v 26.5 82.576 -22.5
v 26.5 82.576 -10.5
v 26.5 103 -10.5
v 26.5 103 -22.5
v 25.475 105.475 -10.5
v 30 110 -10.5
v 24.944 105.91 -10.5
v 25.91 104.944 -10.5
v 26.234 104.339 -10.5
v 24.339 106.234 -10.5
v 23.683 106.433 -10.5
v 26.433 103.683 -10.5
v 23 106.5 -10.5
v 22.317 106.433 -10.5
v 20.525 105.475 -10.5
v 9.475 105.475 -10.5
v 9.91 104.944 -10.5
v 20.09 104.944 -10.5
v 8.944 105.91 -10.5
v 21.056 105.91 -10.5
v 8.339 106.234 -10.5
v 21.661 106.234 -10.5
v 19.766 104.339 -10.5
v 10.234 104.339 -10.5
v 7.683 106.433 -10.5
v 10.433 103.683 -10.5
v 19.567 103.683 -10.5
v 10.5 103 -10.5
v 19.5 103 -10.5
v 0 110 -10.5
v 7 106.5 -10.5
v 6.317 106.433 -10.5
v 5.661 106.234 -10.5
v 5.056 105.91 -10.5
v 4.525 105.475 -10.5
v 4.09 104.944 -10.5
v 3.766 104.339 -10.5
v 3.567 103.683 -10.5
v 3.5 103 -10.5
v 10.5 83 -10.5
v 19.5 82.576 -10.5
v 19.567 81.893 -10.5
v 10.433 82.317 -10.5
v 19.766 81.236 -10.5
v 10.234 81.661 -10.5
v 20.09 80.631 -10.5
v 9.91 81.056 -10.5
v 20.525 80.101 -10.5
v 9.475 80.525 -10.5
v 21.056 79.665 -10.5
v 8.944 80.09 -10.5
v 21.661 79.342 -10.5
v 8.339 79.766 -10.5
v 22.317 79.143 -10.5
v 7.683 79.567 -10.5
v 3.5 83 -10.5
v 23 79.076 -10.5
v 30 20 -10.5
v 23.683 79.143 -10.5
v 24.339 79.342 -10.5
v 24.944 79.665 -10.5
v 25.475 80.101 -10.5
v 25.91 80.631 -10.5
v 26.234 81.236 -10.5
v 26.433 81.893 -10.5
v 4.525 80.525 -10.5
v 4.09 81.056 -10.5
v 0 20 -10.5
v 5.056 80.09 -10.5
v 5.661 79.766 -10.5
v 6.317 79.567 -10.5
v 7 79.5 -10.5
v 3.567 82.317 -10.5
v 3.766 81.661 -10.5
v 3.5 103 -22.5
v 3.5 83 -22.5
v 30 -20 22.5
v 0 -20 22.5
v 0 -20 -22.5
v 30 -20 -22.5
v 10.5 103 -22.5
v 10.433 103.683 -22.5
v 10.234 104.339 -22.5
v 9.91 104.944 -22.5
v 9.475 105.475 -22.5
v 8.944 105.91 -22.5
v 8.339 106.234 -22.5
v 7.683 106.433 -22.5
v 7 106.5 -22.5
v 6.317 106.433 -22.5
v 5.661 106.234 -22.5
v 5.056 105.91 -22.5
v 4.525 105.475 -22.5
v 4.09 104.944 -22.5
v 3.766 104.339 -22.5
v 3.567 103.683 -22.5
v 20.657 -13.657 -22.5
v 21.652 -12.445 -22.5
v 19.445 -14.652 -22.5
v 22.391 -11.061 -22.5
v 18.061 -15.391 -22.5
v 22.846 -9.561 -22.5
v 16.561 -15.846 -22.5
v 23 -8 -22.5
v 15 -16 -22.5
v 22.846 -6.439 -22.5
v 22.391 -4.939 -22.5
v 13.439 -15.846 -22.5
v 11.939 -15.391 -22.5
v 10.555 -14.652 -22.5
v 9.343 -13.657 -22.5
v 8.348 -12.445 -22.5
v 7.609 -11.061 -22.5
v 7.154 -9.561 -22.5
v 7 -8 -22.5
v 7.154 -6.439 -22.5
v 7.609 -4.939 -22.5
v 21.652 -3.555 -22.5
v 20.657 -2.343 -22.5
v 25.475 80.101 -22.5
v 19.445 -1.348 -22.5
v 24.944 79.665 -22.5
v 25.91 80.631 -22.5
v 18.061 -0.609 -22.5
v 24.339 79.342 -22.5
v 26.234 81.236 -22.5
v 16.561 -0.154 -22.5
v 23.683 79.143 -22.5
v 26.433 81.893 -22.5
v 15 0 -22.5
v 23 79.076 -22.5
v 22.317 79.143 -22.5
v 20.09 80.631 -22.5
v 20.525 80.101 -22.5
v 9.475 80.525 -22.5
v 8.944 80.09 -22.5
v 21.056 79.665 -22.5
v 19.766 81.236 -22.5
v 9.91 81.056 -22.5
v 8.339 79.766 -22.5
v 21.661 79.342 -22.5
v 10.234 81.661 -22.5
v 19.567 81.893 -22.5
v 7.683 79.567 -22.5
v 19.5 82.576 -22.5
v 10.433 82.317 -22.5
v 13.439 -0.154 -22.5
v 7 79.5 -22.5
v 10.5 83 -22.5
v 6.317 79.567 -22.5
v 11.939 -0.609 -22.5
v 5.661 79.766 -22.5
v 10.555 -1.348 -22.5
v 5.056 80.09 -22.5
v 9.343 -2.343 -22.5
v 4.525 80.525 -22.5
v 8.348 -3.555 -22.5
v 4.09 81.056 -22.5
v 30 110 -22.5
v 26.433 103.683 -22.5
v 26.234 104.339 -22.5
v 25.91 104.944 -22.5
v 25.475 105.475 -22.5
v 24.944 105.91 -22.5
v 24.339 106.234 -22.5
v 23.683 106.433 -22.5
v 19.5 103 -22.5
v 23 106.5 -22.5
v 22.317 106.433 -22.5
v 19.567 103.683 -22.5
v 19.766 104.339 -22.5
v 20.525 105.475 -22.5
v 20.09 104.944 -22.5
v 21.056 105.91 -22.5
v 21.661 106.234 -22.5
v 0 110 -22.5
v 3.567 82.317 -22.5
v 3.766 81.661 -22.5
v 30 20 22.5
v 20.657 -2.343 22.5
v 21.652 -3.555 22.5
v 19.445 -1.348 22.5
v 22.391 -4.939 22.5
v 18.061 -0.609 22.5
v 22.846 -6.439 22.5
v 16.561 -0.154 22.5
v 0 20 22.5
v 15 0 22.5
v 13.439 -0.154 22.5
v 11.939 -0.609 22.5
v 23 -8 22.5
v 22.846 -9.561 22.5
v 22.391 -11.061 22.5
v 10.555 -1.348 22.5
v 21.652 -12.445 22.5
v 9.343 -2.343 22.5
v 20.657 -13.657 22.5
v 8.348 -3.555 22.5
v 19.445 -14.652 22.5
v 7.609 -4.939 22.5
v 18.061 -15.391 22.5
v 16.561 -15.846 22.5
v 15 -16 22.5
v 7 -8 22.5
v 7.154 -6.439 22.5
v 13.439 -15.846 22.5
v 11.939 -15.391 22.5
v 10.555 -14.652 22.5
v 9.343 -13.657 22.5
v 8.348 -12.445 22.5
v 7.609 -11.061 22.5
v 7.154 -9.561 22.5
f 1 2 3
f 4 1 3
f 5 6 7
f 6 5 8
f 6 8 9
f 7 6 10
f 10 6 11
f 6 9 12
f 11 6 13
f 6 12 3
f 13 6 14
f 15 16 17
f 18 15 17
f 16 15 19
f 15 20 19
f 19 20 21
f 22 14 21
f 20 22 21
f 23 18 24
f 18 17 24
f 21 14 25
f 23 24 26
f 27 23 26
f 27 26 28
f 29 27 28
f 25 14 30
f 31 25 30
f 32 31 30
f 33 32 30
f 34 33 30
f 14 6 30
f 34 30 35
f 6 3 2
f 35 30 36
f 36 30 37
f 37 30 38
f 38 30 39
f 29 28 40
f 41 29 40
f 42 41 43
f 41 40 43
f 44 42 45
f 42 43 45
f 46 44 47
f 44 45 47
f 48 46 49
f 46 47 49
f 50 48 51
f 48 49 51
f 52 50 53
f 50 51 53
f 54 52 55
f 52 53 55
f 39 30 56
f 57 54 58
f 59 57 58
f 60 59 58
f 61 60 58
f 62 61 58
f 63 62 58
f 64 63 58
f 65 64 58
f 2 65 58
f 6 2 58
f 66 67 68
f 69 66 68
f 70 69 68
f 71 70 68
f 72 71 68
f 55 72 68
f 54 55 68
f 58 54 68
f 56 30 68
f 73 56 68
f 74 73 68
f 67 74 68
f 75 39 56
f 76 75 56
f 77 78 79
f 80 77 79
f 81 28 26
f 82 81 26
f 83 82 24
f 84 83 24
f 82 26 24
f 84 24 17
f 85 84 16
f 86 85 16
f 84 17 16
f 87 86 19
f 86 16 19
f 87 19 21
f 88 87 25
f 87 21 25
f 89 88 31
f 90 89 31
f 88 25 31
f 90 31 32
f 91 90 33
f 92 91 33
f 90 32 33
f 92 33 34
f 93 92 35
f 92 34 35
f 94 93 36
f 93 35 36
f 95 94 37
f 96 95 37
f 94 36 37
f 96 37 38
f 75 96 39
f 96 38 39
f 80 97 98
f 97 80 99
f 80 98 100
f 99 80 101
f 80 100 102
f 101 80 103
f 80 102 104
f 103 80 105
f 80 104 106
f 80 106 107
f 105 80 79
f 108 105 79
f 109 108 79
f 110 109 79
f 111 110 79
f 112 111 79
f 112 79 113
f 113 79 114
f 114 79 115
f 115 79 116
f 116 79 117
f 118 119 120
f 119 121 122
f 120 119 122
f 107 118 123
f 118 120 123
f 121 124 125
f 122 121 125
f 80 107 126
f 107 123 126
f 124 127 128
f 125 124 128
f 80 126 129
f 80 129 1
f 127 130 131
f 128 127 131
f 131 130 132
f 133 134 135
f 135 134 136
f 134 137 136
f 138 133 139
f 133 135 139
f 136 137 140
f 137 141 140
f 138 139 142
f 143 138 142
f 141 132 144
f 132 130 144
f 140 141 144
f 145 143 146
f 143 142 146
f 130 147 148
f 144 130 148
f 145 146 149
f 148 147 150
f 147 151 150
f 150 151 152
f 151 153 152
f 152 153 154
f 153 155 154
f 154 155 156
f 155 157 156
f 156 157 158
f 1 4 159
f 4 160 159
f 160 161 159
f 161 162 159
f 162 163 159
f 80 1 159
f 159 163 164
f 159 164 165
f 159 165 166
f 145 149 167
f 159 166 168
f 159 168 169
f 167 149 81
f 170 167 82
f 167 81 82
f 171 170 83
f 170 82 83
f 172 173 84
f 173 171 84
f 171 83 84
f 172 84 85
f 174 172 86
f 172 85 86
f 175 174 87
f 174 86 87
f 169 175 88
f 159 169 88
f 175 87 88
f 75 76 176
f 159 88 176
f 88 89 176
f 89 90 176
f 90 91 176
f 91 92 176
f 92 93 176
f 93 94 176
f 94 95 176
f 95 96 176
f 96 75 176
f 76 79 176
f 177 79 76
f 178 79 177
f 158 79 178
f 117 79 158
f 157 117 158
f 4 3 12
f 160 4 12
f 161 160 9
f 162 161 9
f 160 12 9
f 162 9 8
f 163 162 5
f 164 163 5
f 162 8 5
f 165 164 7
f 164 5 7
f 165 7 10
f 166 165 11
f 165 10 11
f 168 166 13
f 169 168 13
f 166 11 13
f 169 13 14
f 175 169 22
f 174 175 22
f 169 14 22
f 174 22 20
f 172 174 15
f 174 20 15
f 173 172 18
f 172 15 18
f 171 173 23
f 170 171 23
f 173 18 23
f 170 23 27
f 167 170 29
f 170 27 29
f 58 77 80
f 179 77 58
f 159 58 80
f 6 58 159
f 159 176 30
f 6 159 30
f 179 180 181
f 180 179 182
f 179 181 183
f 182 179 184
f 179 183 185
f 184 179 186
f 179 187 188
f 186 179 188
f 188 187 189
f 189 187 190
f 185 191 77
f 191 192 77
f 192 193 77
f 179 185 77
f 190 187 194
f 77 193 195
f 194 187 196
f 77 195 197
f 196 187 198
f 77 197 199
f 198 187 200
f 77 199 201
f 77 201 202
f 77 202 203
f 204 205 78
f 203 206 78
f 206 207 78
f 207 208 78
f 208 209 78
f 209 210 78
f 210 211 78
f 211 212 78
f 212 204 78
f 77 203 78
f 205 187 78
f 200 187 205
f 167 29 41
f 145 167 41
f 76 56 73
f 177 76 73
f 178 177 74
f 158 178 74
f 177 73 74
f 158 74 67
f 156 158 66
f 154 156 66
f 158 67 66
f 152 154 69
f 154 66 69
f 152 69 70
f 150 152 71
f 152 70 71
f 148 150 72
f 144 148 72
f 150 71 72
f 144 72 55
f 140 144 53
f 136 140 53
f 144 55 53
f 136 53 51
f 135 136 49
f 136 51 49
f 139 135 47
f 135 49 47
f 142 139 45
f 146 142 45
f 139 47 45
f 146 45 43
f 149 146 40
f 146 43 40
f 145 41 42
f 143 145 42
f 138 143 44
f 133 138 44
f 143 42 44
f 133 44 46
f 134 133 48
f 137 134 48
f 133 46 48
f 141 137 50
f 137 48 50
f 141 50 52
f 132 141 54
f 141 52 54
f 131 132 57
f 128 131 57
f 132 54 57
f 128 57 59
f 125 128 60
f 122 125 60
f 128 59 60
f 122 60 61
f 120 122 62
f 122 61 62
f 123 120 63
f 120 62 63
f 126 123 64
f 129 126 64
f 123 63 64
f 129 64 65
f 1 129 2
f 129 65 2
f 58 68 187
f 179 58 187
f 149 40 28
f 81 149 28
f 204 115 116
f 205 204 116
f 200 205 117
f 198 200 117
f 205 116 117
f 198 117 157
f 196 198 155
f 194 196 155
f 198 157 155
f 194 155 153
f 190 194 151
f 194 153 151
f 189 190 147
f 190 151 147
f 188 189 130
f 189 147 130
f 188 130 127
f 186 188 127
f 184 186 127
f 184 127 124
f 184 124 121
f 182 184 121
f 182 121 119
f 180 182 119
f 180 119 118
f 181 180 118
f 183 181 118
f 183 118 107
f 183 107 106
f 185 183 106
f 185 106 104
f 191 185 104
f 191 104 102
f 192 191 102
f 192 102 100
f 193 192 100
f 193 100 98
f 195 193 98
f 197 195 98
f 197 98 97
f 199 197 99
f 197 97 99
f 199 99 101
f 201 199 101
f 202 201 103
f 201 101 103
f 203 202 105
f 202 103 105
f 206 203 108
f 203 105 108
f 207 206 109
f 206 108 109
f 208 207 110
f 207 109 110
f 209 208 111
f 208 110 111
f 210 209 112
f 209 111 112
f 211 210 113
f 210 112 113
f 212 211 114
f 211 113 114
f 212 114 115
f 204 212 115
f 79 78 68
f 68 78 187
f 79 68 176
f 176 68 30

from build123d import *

# Parameters (mm, degrees)
F1_DEPTH = 30
F3_DEPTH = 12
F5_D     = 16


with BuildPart() as f1:
    # F0 (on Right) → F1 (new body)
    with BuildSketch(Plane.YZ):
        Polygon((-20, -22.5), (20, -22.5), (110, -22.5), (110, -10.5), (20, -10.5), (20, 22.5), (-20, 22.5), align=None)
    extrude(amount=F1_DEPTH)

    # F2 (on face) → F3 (cut)
    with BuildSketch(Plane.XY.offset(-10.5)):
        with BuildLine():
            ThreePointArc((10.5, 103), (7, 106.5), (3.5, 103))
            Line((3.5, 103), (3.5, 83))
            ThreePointArc((3.5, 83), (7, 79.5), (10.5, 83))
            Line((10.5, 83), (10.5, 103))
        make_face()
        with BuildLine():
            Line((26.5, 82.575567), (26.5, 103))
            ThreePointArc((26.5, 103), (23, 106.5), (19.5, 103))
            Line((19.5, 103), (19.5, 82.575567))
            ThreePointArc((19.5, 82.575567), (23, 79.075567), (26.5, 82.575567))
        make_face()
    extrude(amount=-F3_DEPTH, mode=Mode.SUBTRACT)

    # F5 (through all)
    with Locations(Plane.XY.offset(22.5)):
        with Locations((15, -8)):
            Hole(F5_D / 2)


solid = f1.part
